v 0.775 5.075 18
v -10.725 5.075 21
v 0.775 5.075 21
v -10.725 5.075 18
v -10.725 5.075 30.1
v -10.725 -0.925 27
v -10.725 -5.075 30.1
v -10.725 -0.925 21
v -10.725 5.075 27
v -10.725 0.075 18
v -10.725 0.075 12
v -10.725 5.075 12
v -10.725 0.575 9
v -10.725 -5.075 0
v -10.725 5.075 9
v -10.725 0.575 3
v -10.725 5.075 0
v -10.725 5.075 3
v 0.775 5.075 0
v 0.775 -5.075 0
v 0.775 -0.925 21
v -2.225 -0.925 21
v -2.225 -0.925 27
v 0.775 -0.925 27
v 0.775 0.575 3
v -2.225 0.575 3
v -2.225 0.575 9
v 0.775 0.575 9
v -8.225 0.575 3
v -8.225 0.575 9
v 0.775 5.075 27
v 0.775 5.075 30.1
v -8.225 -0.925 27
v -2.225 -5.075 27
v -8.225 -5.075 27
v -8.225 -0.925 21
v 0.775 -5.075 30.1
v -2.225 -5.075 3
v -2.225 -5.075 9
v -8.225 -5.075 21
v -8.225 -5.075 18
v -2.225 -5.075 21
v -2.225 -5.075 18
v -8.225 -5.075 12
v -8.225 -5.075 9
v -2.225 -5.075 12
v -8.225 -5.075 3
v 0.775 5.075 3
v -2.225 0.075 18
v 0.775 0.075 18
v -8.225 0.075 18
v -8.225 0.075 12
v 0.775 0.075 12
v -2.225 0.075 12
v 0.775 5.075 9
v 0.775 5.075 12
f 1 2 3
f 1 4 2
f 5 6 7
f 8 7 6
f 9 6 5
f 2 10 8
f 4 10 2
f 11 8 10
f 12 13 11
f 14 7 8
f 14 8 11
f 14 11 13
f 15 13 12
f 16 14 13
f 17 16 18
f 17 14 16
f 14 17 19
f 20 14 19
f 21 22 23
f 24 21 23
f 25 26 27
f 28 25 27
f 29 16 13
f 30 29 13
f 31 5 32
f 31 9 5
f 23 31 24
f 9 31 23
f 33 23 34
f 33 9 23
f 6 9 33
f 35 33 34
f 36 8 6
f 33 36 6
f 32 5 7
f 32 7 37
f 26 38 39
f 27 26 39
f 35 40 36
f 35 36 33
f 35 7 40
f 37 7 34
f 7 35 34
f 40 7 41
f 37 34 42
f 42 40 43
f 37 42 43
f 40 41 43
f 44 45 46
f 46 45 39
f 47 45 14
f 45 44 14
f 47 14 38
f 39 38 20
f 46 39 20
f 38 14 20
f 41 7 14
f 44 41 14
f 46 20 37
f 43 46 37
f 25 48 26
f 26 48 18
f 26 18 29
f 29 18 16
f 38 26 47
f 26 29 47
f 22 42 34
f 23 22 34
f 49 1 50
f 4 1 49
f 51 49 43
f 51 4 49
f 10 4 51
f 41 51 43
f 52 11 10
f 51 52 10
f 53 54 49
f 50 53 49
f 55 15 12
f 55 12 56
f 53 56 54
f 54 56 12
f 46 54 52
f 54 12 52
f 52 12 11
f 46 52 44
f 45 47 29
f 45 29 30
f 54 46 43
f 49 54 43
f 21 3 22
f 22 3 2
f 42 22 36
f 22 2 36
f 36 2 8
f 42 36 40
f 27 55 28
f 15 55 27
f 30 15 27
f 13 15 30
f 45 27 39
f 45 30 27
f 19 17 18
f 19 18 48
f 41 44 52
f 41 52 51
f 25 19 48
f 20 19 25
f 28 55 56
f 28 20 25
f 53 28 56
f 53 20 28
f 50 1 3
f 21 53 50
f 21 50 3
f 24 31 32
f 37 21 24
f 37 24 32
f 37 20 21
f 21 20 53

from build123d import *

# Parameters (mm, degrees)
F0_W     = 21.45
F0_H     = 10.15
F1_DEPTH = 30.1
F2_W     = 4.5
F2_H     = 6
F2_W_2   = 5
F2_W_3   = 6
F3_DEPTH = 20
F4_W     = 6
F4_H     = 6
F5_DEPTH = 25
F6_W     = 38.292414
F6_H     = 55.741895
F7_DEPTH = 25


with BuildPart() as f1:
    # F0 (on Top) → F1 (new body)
    with BuildSketch(Plane.XY):
        Rectangle(F0_W, F0_H)
        Polygon((10.725, 7.226717), (10.725, 5.075), (10.725, -5.075), (13.978312, -5.075), (13.978312, 7.226717), align=None)
        Polygon((13.978312, 7.226717), (13.978312, -5.075), (17.385745, -5.075), (17.385745, 9.236451), (13.978312, 9.236451), align=None)
    extrude(amount=F1_DEPTH)

    # F2 (on face) → F3 (cut)
    with BuildSketch(Plane(origin=(-10.725, 0, 0), x_dir=(0, -1, 0), z_dir=(-1, 0, 0))):
        with Locations((-2.825, 6)):
            Rectangle(F2_W, F2_H)
        with Locations((-2.575, 15)):
            Rectangle(F2_W_2, F2_H)
        with Locations((-2.075, 24)):
            Rectangle(F2_W_3, F2_H)
    extrude(amount=-F3_DEPTH, mode=Mode.SUBTRACT)

    # F4 (on face) → F5 (cut)
    with BuildSketch(Plane.XZ.offset(5.075)):
        with Locations((-5.225, 6)):
            Rectangle(F4_W, F4_H)
        with Locations((-5.225, 15)):
            Rectangle(F4_W, F4_H)
        with Locations((-5.225, 24)):
            Rectangle(F4_W, F4_H)
    extrude(amount=-F5_DEPTH, mode=Mode.SUBTRACT)

    # F6 (on face) → F7 (cut)
    with BuildSketch(Plane.XZ.offset(5.075)):
        with Locations((19.921207, 9.509602)):
            Rectangle(F6_W, F6_H)
    extrude(amount=-F7_DEPTH, mode=Mode.SUBTRACT)


solid = f1.part
